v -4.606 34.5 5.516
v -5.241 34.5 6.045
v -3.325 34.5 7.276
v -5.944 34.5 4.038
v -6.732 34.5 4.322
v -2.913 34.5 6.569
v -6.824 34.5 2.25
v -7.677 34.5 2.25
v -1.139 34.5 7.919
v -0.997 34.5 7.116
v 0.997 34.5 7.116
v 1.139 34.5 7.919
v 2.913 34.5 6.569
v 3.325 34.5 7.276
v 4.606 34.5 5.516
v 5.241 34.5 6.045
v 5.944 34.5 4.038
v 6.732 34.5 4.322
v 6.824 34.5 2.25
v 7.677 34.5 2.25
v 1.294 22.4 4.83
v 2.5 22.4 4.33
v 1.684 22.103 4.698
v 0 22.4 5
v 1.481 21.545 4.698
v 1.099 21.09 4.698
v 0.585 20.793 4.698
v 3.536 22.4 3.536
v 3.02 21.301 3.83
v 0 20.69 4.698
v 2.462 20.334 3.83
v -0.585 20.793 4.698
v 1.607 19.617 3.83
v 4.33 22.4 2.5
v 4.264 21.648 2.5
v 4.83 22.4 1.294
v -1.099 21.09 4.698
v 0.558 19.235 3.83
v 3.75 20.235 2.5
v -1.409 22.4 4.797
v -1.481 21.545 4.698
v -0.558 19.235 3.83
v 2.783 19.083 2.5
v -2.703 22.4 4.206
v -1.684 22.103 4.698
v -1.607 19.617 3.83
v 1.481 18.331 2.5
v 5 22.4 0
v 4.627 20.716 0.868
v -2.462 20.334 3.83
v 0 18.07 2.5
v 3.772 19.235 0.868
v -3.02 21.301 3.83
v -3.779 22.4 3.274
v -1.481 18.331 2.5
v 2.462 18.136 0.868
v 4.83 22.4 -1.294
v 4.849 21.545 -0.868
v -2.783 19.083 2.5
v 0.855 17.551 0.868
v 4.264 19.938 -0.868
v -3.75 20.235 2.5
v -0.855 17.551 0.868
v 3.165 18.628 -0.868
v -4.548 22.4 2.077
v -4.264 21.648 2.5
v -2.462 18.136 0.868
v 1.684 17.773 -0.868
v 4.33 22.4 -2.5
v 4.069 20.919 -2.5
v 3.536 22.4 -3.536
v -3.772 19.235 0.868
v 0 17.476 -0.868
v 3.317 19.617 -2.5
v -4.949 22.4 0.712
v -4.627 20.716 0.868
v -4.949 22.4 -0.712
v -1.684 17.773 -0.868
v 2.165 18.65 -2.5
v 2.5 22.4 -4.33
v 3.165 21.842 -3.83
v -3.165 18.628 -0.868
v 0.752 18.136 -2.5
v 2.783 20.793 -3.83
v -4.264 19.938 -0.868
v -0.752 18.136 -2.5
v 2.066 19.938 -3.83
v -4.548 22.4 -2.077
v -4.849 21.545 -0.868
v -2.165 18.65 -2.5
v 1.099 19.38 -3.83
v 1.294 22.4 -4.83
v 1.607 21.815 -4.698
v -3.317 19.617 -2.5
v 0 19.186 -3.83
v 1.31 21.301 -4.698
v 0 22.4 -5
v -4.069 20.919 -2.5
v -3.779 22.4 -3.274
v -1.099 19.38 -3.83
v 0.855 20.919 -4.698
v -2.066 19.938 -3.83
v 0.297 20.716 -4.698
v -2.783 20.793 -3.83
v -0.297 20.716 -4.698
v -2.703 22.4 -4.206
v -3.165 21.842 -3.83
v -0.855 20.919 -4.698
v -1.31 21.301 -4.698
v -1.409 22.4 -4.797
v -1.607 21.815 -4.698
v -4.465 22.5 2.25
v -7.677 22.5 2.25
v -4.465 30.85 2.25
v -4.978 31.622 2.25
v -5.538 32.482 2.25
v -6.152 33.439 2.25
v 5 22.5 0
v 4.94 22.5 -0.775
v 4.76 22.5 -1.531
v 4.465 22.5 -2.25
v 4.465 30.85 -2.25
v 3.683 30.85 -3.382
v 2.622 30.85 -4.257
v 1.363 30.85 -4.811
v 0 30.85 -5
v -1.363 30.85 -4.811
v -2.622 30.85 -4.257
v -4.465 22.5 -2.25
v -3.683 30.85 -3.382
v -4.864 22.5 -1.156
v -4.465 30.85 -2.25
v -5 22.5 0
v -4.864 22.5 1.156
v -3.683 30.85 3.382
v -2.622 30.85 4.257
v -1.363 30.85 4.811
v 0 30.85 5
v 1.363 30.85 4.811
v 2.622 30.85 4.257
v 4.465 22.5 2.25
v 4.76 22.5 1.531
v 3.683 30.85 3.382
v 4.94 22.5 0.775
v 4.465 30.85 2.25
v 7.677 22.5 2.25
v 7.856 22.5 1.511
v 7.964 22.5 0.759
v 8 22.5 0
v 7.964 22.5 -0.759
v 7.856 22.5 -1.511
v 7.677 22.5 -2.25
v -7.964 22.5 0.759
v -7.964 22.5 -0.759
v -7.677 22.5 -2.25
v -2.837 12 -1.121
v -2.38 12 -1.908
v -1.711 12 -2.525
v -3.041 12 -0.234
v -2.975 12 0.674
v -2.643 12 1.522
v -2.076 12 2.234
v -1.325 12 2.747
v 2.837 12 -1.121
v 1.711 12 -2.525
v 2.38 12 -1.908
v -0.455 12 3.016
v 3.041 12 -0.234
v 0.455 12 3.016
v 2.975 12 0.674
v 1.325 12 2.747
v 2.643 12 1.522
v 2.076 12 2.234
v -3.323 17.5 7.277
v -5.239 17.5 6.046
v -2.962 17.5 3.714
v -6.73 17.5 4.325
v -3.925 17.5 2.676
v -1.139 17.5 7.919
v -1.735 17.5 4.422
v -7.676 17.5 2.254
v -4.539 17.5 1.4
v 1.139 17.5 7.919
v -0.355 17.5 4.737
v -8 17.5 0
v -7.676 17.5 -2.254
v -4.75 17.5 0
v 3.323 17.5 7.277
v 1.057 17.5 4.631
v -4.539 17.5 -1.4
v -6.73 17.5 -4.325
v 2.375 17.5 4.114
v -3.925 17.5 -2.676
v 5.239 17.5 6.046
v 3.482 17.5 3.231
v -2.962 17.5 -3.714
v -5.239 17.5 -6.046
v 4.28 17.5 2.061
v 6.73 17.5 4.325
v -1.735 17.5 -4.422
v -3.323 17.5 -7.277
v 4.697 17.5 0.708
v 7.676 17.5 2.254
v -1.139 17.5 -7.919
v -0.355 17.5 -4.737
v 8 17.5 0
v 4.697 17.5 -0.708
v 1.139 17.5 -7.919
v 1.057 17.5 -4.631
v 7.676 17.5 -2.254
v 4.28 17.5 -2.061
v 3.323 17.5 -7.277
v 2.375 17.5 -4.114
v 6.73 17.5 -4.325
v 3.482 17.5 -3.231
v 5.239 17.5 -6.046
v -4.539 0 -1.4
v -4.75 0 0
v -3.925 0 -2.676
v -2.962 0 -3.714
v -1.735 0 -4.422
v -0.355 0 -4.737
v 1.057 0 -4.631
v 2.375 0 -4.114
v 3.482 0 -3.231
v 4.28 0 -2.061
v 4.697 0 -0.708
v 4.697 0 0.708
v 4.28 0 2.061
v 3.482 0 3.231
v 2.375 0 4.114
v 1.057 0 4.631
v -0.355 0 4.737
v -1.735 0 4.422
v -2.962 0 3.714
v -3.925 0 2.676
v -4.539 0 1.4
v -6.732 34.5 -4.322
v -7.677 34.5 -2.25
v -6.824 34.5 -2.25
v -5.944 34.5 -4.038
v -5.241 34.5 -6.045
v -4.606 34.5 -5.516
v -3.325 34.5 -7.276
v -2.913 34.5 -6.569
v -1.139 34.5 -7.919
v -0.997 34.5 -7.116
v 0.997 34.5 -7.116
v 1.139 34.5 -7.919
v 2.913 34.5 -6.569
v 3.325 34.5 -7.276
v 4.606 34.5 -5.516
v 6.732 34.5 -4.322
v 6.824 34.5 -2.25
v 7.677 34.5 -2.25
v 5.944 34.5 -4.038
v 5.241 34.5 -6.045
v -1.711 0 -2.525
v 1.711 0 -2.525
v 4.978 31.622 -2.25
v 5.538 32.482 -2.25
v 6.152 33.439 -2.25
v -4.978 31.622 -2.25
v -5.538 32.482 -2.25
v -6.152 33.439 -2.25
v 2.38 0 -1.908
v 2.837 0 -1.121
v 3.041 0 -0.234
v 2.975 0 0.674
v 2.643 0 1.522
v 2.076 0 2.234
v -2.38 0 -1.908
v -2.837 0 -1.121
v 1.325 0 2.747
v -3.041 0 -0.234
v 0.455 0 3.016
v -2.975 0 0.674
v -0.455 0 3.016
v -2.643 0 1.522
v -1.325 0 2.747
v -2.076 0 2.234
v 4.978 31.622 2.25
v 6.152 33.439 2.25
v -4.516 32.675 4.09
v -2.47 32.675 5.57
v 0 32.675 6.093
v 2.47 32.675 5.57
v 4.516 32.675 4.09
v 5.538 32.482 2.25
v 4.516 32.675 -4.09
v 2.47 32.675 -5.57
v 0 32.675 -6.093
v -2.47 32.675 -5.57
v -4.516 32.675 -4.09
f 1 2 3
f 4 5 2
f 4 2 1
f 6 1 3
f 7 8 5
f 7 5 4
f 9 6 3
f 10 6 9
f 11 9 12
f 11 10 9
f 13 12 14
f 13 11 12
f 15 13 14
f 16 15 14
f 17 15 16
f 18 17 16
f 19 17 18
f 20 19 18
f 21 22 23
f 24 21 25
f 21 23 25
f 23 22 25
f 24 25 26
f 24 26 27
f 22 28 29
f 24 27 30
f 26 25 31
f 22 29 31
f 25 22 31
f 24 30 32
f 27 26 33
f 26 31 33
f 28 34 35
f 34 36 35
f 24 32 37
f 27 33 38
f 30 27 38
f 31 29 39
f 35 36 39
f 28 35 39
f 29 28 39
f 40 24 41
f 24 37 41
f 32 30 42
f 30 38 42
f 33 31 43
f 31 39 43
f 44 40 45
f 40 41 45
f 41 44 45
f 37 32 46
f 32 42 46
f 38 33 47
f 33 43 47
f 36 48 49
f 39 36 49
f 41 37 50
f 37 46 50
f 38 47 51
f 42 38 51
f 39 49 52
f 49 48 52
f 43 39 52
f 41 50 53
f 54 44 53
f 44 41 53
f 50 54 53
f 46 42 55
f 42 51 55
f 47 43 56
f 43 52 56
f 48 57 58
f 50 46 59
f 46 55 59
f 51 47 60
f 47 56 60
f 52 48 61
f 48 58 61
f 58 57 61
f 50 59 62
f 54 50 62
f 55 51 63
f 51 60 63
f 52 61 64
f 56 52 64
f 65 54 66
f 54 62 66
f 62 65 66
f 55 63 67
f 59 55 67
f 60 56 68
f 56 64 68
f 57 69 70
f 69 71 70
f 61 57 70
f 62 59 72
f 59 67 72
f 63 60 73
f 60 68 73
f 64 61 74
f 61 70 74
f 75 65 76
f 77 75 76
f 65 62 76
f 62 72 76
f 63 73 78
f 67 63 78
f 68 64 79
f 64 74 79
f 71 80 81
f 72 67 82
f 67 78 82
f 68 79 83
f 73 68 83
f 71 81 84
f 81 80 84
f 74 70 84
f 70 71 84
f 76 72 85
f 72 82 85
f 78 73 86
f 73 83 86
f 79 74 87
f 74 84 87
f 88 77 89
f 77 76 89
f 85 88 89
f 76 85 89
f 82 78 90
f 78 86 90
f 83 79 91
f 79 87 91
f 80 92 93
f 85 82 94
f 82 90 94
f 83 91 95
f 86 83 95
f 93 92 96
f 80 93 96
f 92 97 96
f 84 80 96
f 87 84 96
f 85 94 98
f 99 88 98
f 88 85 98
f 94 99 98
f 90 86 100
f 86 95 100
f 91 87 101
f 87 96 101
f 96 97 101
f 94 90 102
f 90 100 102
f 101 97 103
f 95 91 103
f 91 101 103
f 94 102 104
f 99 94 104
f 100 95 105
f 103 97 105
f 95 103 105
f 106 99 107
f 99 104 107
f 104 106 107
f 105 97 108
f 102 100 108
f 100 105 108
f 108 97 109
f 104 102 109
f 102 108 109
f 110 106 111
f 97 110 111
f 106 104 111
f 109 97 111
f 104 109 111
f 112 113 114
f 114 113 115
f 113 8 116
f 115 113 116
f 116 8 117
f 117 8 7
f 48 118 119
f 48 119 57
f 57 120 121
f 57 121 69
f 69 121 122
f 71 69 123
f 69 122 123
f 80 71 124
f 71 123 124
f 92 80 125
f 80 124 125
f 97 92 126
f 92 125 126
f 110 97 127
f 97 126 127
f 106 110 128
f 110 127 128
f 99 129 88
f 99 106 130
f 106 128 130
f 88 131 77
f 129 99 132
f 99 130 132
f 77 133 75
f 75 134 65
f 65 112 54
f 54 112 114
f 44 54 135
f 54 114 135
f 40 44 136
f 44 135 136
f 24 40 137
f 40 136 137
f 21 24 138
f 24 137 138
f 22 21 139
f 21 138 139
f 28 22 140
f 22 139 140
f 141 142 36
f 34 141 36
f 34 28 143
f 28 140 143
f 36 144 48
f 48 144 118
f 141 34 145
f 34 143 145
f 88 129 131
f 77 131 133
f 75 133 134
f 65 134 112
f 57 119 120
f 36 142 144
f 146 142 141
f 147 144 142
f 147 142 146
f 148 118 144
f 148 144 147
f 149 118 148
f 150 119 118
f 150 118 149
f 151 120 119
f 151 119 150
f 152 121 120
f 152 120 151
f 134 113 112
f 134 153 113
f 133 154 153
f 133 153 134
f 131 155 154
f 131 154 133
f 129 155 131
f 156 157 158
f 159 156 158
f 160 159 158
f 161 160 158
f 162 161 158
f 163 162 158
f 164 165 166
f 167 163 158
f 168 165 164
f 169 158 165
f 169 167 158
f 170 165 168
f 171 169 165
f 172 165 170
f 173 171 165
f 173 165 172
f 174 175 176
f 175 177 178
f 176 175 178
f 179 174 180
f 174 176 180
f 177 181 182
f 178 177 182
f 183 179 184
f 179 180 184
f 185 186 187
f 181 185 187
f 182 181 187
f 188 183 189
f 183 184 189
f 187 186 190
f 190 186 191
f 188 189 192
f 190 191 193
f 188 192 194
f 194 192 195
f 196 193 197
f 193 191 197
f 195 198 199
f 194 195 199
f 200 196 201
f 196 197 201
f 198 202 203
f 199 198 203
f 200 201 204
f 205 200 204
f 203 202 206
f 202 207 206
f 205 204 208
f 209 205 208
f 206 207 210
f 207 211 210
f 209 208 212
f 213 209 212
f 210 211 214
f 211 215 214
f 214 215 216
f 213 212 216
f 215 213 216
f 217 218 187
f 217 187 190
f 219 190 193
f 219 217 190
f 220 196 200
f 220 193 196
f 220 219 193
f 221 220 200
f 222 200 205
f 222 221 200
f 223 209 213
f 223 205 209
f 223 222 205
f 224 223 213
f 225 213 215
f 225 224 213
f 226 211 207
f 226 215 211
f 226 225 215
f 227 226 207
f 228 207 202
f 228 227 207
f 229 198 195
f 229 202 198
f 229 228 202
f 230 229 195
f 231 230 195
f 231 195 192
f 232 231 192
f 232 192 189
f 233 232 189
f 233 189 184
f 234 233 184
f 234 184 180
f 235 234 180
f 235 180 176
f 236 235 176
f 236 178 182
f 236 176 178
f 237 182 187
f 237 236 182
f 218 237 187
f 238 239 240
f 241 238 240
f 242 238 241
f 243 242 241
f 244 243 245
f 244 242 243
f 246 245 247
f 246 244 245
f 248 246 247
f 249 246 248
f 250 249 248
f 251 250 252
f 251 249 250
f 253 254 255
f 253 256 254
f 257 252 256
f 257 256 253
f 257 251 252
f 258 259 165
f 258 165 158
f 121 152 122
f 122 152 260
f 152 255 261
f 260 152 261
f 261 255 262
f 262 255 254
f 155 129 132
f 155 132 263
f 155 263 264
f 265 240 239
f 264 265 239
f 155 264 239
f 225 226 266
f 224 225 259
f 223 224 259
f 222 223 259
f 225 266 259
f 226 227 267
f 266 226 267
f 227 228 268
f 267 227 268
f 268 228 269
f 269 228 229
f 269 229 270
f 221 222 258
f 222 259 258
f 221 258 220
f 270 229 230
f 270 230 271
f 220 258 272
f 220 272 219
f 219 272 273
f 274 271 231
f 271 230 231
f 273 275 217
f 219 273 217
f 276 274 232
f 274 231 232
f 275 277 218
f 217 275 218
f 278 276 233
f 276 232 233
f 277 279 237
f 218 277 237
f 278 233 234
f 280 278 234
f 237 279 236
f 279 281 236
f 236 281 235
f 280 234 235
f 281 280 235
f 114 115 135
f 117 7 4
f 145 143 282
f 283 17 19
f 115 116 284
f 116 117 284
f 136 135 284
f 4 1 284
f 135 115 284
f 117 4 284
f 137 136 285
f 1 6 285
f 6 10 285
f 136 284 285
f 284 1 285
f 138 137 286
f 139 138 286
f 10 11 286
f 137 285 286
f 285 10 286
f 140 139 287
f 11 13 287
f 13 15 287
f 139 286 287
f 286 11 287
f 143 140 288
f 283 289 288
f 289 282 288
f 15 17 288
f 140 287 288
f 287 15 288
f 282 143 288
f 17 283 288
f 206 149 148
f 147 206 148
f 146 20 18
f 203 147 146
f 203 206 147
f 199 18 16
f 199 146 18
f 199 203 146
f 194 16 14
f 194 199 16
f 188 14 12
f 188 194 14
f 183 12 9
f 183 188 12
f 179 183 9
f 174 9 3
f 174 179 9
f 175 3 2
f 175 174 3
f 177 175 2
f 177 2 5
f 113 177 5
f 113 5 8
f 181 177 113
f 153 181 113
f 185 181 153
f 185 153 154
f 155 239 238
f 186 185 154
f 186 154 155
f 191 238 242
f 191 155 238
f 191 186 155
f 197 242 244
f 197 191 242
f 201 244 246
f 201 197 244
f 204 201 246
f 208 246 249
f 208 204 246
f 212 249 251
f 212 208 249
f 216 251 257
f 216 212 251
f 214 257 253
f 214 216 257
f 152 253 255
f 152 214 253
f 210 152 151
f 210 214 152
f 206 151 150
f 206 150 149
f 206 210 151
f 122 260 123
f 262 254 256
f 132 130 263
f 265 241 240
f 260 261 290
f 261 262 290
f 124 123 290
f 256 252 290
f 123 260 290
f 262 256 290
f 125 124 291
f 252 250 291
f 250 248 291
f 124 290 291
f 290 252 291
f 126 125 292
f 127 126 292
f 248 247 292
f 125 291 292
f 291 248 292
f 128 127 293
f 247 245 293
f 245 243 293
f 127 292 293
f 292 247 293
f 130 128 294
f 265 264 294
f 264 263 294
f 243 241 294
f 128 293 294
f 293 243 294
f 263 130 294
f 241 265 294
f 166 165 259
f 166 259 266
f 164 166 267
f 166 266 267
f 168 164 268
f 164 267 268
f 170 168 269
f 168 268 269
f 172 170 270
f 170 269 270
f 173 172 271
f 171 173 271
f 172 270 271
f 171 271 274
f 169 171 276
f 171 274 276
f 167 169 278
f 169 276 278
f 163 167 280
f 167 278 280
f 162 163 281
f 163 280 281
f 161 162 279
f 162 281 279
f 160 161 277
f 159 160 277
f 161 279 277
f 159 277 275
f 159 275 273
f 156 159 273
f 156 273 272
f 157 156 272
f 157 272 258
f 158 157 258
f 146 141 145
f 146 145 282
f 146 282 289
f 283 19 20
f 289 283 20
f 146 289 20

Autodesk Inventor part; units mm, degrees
ref_plane "YZ Plane" through (0, 0, 0) normal (1, 0, 0) x (0, 1, 0)
ref_plane "XZ Plane" through (0, 0, 0) normal (0, 1, 0) x (-1, 0, 0)
ref_plane "XY Plane" through (0, 0, 0) normal (0, 0, 1) x (1, 0, 0)
sketch "Sketch1" plane through (0, 0, 0) normal (0, 1, 0) x (-1, 0, 0)
  circle A0 centre (0, 0) radius 4.75
  dimension "d0" = 9.5
extrude "Extrusion1" add sketch "Sketch1" along normal blind 17.5
sketch "Sketch2" plane through (0, 17.5, 0) normal (0, 1, 0) x (1, 0, 0)
  circle A0 centre (0, 0) radius 8
  dimension "d3" = 16
extrude "Extrusion2" add sketch "Sketch2" along normal blind 17
sketch "Sketch3" plane through (0, 0, 0) normal (0, 0, 1) x (1, 0, 0)
  line L0 (0, 39.2) -> (0, 22.5)
  line L1 (0, 22.5) -> (10, 39.2)
  line L2 (10, 39.2) -> (0, 39.2)
  line L3 (8, 17.5) -> (-8, 17.5) projected
  line L4 (0, -7.84) -> (0, 47.04) projected
  point P0 (0, 0)
  dimension "d6" = 5
  dimension "d7" = 10
  dimension "d8" = 16.7
revolve "Revolution1" cut sketch "Sketch3" angle 360 about axis through (0, -10, 0) along (0, 1, 0)
sketch "Sketch4" plane through (0, 34.5, 0) normal (0, 1, 0) x (1, 0, 0)
  circle A0 centre (0, 0) radius 5
  dimension "d10" = 10
extrude "Extrusion3" cut sketch "Sketch4" against normal blind 12.1
sketch "Sketch5" plane through (0, 34.5, 0) normal (0, 1, 0) x (1, 0, 0)
  line L0 (-8.5, -2.25) -> (8.5, -2.25)
  line L1 (8.5, -2.25) -> (8.5, 2.25)
  line L2 (8.5, 2.25) -> (-8.5, 2.25)
  line L3 (-8.5, 2.25) -> (-8.5, -2.25)
  line L4 (-8.5, -2.25) -> (8.5, 2.25) construction
  line L5 (8.5, -2.25) -> (-8.5, 2.25) construction
  point P0 (0, 0)
  dimension "d13" = 17
  dimension "d14" = 4.5
extrude "Extrusion4" cut sketch "Sketch5" against normal blind 12
sketch "Sketch6" plane through (6.8243, 34.5, -2.25) normal (0, 0, 1) x (1, 0, 0)
  line L0 (-13.6486, 0) -> (0, 0) projected
  line L1 (-11.2894, -3.65) -> (-2.3591, -3.65) projected
  line L2 (0, 0) -> (0, -3.5) construction
  point P0 (-6.8243, -34.5)
  dimension "d17" = 3.65
  dimension "d18" = 2.3591
sketch "Sketch9" plane through (0, 22.4, 0) normal (0, 1, 0) x (1, 0, 0)
  circle A0 centre (0, 0) radius 5 projected
  arc A1 (0, -5) -> (0, 5) centre (0, 0) ccw
  line L0 (0, 0) -> (0, -5) construction
  line L1 (0, 0) -> (0, 5) construction
  line L2 (0, 5) -> (0, -5)
  dimension "d19" = 180
revolve "Revolution2" cut sketch "Sketch9" angle 360 about axis through (0, 22.4, 0) along (0, 0, -1) picked at (1.0391, 1.3031) contours A0 L2
sketch "Sketch16" plane through (0, 0, 0) normal (0, -1, 0) x (1, 0, 0)
  arc A0 (1.7108, -2.525) -> (-1.7108, -2.525) centre (0, 0) ccw
  line L0 (1.7108, -2.525) -> (-1.7108, -2.525)
  dimension "d55" = 6.1
  dimension "d56" = 0.525
extrude "Extrusion8" cut sketch "Sketch16" against normal blind 12
properties part number "shaft"
